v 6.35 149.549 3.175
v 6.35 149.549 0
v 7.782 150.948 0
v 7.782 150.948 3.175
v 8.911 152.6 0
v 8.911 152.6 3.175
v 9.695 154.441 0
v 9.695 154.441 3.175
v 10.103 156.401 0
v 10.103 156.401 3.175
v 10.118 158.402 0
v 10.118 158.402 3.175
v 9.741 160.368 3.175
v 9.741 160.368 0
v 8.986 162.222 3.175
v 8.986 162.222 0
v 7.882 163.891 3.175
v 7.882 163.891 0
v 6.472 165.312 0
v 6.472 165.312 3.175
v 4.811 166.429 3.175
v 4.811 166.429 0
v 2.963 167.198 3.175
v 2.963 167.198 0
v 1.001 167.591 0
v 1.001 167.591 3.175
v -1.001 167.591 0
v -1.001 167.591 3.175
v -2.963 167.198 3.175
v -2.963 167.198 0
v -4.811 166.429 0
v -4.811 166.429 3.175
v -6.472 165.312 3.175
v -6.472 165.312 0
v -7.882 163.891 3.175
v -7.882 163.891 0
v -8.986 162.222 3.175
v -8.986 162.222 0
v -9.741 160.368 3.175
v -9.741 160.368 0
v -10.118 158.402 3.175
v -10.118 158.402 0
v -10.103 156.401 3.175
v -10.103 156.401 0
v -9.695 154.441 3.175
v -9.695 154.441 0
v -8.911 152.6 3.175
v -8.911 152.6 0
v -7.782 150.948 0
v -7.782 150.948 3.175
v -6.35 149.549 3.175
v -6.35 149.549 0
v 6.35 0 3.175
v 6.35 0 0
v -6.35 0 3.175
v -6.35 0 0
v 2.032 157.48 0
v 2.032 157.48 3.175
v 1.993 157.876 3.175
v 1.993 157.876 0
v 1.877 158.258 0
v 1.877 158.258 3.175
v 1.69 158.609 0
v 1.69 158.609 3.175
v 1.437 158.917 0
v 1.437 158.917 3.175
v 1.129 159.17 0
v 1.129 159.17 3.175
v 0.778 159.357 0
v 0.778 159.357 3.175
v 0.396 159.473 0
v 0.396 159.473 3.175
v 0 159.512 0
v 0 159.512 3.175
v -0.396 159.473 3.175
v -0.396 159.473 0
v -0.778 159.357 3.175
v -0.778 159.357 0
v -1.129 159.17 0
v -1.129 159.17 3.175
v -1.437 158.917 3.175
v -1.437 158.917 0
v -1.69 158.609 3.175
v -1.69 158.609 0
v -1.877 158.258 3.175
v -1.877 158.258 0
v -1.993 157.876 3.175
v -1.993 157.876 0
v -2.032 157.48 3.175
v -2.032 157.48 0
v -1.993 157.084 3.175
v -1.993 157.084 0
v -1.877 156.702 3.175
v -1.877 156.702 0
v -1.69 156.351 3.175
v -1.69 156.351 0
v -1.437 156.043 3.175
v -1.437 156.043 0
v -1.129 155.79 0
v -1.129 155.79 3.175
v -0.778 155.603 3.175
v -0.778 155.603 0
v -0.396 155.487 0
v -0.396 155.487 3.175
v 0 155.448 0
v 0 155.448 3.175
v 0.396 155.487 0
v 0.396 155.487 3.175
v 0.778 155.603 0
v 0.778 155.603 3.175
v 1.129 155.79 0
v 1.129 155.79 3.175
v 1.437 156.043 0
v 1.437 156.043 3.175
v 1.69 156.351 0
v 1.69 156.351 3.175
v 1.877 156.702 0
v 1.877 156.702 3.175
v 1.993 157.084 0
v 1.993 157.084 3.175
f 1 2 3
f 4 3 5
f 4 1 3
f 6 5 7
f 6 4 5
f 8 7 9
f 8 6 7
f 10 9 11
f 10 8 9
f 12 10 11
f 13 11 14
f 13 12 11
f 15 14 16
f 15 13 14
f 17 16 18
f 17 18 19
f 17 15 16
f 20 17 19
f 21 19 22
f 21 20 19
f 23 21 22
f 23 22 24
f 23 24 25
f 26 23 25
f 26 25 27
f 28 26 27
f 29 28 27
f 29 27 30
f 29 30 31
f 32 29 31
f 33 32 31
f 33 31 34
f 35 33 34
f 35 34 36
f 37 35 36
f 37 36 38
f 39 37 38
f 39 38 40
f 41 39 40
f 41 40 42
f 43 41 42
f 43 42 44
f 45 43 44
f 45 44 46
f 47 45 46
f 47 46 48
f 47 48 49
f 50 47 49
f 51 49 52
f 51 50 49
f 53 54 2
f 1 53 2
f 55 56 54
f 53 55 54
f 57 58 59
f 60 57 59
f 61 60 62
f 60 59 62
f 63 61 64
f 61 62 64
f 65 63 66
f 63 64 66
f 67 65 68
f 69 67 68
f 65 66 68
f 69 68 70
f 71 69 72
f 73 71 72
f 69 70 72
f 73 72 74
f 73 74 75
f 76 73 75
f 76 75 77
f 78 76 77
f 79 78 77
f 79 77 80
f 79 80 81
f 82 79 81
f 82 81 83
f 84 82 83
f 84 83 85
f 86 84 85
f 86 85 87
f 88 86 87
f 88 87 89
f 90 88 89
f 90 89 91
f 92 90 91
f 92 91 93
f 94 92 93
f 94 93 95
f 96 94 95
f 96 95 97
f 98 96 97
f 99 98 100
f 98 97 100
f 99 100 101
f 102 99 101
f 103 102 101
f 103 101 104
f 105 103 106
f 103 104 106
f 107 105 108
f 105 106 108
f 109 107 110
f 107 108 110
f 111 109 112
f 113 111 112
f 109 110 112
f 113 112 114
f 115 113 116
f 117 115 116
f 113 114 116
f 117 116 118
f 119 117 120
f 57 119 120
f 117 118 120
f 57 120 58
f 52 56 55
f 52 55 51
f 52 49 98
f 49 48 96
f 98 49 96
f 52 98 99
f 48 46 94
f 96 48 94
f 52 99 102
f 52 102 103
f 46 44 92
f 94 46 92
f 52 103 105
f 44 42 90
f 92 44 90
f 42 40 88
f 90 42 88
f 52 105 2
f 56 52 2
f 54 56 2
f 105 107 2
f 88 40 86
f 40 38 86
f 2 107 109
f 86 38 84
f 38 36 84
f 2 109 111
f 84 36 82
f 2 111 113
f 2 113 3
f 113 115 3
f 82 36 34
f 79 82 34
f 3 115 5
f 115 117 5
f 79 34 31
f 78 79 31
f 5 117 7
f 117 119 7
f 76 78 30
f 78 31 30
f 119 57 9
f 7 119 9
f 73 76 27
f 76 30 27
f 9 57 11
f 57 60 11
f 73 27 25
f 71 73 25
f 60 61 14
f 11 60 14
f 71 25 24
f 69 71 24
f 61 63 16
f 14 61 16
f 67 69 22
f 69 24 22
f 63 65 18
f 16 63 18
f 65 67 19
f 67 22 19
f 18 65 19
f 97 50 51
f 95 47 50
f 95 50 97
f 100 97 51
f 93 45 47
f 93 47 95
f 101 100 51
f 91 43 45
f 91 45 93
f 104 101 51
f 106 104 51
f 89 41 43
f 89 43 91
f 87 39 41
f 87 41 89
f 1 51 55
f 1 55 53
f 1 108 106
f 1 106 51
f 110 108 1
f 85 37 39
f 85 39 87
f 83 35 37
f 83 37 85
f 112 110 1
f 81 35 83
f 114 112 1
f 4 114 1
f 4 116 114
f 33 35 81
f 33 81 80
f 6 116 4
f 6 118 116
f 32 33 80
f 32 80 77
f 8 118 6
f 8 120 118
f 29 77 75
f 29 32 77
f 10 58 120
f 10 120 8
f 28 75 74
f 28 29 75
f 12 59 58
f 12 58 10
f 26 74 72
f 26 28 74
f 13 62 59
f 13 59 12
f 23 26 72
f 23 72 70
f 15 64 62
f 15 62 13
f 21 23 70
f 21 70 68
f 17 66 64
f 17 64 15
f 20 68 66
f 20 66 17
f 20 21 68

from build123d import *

# Parameters (mm, degrees)
SKETCH1_W           = 12.7
SKETCH1_H           = 165.1
BOSS_EXTRUDE1_DEPTH = 3.175
SKETCH3_R           = 10.16
BOSS_EXTRUDE2_DEPTH = 3.175
SKETCH4_R           = 2.032
CUT_EXTRUDE2_DEPTH  = 168.977605129


with BuildPart() as part:
    # Sketch1 → Boss-Extrude1 (new body)
    with BuildSketch(Plane.XY):
        with Locations((0, 82.55)):
            Rectangle(SKETCH1_W, SKETCH1_H)
    extrude(amount=BOSS_EXTRUDE1_DEPTH)

    # Sketch3 → Boss-Extrude2 (add)
    with BuildSketch(Plane.XY.offset(3.175)):
        with Locations((0, 157.48)):
            Circle(SKETCH3_R)
    extrude(amount=-BOSS_EXTRUDE2_DEPTH)

    # Sketch4 → Cut-Extrude2 (cut, through all)
    with BuildSketch(Plane.XY.offset(3.175)):
        with Locations((0, 157.48)):
            Circle(SKETCH4_R)
    extrude(amount=-CUT_EXTRUDE2_DEPTH, mode=Mode.SUBTRACT)


solid = part.part
